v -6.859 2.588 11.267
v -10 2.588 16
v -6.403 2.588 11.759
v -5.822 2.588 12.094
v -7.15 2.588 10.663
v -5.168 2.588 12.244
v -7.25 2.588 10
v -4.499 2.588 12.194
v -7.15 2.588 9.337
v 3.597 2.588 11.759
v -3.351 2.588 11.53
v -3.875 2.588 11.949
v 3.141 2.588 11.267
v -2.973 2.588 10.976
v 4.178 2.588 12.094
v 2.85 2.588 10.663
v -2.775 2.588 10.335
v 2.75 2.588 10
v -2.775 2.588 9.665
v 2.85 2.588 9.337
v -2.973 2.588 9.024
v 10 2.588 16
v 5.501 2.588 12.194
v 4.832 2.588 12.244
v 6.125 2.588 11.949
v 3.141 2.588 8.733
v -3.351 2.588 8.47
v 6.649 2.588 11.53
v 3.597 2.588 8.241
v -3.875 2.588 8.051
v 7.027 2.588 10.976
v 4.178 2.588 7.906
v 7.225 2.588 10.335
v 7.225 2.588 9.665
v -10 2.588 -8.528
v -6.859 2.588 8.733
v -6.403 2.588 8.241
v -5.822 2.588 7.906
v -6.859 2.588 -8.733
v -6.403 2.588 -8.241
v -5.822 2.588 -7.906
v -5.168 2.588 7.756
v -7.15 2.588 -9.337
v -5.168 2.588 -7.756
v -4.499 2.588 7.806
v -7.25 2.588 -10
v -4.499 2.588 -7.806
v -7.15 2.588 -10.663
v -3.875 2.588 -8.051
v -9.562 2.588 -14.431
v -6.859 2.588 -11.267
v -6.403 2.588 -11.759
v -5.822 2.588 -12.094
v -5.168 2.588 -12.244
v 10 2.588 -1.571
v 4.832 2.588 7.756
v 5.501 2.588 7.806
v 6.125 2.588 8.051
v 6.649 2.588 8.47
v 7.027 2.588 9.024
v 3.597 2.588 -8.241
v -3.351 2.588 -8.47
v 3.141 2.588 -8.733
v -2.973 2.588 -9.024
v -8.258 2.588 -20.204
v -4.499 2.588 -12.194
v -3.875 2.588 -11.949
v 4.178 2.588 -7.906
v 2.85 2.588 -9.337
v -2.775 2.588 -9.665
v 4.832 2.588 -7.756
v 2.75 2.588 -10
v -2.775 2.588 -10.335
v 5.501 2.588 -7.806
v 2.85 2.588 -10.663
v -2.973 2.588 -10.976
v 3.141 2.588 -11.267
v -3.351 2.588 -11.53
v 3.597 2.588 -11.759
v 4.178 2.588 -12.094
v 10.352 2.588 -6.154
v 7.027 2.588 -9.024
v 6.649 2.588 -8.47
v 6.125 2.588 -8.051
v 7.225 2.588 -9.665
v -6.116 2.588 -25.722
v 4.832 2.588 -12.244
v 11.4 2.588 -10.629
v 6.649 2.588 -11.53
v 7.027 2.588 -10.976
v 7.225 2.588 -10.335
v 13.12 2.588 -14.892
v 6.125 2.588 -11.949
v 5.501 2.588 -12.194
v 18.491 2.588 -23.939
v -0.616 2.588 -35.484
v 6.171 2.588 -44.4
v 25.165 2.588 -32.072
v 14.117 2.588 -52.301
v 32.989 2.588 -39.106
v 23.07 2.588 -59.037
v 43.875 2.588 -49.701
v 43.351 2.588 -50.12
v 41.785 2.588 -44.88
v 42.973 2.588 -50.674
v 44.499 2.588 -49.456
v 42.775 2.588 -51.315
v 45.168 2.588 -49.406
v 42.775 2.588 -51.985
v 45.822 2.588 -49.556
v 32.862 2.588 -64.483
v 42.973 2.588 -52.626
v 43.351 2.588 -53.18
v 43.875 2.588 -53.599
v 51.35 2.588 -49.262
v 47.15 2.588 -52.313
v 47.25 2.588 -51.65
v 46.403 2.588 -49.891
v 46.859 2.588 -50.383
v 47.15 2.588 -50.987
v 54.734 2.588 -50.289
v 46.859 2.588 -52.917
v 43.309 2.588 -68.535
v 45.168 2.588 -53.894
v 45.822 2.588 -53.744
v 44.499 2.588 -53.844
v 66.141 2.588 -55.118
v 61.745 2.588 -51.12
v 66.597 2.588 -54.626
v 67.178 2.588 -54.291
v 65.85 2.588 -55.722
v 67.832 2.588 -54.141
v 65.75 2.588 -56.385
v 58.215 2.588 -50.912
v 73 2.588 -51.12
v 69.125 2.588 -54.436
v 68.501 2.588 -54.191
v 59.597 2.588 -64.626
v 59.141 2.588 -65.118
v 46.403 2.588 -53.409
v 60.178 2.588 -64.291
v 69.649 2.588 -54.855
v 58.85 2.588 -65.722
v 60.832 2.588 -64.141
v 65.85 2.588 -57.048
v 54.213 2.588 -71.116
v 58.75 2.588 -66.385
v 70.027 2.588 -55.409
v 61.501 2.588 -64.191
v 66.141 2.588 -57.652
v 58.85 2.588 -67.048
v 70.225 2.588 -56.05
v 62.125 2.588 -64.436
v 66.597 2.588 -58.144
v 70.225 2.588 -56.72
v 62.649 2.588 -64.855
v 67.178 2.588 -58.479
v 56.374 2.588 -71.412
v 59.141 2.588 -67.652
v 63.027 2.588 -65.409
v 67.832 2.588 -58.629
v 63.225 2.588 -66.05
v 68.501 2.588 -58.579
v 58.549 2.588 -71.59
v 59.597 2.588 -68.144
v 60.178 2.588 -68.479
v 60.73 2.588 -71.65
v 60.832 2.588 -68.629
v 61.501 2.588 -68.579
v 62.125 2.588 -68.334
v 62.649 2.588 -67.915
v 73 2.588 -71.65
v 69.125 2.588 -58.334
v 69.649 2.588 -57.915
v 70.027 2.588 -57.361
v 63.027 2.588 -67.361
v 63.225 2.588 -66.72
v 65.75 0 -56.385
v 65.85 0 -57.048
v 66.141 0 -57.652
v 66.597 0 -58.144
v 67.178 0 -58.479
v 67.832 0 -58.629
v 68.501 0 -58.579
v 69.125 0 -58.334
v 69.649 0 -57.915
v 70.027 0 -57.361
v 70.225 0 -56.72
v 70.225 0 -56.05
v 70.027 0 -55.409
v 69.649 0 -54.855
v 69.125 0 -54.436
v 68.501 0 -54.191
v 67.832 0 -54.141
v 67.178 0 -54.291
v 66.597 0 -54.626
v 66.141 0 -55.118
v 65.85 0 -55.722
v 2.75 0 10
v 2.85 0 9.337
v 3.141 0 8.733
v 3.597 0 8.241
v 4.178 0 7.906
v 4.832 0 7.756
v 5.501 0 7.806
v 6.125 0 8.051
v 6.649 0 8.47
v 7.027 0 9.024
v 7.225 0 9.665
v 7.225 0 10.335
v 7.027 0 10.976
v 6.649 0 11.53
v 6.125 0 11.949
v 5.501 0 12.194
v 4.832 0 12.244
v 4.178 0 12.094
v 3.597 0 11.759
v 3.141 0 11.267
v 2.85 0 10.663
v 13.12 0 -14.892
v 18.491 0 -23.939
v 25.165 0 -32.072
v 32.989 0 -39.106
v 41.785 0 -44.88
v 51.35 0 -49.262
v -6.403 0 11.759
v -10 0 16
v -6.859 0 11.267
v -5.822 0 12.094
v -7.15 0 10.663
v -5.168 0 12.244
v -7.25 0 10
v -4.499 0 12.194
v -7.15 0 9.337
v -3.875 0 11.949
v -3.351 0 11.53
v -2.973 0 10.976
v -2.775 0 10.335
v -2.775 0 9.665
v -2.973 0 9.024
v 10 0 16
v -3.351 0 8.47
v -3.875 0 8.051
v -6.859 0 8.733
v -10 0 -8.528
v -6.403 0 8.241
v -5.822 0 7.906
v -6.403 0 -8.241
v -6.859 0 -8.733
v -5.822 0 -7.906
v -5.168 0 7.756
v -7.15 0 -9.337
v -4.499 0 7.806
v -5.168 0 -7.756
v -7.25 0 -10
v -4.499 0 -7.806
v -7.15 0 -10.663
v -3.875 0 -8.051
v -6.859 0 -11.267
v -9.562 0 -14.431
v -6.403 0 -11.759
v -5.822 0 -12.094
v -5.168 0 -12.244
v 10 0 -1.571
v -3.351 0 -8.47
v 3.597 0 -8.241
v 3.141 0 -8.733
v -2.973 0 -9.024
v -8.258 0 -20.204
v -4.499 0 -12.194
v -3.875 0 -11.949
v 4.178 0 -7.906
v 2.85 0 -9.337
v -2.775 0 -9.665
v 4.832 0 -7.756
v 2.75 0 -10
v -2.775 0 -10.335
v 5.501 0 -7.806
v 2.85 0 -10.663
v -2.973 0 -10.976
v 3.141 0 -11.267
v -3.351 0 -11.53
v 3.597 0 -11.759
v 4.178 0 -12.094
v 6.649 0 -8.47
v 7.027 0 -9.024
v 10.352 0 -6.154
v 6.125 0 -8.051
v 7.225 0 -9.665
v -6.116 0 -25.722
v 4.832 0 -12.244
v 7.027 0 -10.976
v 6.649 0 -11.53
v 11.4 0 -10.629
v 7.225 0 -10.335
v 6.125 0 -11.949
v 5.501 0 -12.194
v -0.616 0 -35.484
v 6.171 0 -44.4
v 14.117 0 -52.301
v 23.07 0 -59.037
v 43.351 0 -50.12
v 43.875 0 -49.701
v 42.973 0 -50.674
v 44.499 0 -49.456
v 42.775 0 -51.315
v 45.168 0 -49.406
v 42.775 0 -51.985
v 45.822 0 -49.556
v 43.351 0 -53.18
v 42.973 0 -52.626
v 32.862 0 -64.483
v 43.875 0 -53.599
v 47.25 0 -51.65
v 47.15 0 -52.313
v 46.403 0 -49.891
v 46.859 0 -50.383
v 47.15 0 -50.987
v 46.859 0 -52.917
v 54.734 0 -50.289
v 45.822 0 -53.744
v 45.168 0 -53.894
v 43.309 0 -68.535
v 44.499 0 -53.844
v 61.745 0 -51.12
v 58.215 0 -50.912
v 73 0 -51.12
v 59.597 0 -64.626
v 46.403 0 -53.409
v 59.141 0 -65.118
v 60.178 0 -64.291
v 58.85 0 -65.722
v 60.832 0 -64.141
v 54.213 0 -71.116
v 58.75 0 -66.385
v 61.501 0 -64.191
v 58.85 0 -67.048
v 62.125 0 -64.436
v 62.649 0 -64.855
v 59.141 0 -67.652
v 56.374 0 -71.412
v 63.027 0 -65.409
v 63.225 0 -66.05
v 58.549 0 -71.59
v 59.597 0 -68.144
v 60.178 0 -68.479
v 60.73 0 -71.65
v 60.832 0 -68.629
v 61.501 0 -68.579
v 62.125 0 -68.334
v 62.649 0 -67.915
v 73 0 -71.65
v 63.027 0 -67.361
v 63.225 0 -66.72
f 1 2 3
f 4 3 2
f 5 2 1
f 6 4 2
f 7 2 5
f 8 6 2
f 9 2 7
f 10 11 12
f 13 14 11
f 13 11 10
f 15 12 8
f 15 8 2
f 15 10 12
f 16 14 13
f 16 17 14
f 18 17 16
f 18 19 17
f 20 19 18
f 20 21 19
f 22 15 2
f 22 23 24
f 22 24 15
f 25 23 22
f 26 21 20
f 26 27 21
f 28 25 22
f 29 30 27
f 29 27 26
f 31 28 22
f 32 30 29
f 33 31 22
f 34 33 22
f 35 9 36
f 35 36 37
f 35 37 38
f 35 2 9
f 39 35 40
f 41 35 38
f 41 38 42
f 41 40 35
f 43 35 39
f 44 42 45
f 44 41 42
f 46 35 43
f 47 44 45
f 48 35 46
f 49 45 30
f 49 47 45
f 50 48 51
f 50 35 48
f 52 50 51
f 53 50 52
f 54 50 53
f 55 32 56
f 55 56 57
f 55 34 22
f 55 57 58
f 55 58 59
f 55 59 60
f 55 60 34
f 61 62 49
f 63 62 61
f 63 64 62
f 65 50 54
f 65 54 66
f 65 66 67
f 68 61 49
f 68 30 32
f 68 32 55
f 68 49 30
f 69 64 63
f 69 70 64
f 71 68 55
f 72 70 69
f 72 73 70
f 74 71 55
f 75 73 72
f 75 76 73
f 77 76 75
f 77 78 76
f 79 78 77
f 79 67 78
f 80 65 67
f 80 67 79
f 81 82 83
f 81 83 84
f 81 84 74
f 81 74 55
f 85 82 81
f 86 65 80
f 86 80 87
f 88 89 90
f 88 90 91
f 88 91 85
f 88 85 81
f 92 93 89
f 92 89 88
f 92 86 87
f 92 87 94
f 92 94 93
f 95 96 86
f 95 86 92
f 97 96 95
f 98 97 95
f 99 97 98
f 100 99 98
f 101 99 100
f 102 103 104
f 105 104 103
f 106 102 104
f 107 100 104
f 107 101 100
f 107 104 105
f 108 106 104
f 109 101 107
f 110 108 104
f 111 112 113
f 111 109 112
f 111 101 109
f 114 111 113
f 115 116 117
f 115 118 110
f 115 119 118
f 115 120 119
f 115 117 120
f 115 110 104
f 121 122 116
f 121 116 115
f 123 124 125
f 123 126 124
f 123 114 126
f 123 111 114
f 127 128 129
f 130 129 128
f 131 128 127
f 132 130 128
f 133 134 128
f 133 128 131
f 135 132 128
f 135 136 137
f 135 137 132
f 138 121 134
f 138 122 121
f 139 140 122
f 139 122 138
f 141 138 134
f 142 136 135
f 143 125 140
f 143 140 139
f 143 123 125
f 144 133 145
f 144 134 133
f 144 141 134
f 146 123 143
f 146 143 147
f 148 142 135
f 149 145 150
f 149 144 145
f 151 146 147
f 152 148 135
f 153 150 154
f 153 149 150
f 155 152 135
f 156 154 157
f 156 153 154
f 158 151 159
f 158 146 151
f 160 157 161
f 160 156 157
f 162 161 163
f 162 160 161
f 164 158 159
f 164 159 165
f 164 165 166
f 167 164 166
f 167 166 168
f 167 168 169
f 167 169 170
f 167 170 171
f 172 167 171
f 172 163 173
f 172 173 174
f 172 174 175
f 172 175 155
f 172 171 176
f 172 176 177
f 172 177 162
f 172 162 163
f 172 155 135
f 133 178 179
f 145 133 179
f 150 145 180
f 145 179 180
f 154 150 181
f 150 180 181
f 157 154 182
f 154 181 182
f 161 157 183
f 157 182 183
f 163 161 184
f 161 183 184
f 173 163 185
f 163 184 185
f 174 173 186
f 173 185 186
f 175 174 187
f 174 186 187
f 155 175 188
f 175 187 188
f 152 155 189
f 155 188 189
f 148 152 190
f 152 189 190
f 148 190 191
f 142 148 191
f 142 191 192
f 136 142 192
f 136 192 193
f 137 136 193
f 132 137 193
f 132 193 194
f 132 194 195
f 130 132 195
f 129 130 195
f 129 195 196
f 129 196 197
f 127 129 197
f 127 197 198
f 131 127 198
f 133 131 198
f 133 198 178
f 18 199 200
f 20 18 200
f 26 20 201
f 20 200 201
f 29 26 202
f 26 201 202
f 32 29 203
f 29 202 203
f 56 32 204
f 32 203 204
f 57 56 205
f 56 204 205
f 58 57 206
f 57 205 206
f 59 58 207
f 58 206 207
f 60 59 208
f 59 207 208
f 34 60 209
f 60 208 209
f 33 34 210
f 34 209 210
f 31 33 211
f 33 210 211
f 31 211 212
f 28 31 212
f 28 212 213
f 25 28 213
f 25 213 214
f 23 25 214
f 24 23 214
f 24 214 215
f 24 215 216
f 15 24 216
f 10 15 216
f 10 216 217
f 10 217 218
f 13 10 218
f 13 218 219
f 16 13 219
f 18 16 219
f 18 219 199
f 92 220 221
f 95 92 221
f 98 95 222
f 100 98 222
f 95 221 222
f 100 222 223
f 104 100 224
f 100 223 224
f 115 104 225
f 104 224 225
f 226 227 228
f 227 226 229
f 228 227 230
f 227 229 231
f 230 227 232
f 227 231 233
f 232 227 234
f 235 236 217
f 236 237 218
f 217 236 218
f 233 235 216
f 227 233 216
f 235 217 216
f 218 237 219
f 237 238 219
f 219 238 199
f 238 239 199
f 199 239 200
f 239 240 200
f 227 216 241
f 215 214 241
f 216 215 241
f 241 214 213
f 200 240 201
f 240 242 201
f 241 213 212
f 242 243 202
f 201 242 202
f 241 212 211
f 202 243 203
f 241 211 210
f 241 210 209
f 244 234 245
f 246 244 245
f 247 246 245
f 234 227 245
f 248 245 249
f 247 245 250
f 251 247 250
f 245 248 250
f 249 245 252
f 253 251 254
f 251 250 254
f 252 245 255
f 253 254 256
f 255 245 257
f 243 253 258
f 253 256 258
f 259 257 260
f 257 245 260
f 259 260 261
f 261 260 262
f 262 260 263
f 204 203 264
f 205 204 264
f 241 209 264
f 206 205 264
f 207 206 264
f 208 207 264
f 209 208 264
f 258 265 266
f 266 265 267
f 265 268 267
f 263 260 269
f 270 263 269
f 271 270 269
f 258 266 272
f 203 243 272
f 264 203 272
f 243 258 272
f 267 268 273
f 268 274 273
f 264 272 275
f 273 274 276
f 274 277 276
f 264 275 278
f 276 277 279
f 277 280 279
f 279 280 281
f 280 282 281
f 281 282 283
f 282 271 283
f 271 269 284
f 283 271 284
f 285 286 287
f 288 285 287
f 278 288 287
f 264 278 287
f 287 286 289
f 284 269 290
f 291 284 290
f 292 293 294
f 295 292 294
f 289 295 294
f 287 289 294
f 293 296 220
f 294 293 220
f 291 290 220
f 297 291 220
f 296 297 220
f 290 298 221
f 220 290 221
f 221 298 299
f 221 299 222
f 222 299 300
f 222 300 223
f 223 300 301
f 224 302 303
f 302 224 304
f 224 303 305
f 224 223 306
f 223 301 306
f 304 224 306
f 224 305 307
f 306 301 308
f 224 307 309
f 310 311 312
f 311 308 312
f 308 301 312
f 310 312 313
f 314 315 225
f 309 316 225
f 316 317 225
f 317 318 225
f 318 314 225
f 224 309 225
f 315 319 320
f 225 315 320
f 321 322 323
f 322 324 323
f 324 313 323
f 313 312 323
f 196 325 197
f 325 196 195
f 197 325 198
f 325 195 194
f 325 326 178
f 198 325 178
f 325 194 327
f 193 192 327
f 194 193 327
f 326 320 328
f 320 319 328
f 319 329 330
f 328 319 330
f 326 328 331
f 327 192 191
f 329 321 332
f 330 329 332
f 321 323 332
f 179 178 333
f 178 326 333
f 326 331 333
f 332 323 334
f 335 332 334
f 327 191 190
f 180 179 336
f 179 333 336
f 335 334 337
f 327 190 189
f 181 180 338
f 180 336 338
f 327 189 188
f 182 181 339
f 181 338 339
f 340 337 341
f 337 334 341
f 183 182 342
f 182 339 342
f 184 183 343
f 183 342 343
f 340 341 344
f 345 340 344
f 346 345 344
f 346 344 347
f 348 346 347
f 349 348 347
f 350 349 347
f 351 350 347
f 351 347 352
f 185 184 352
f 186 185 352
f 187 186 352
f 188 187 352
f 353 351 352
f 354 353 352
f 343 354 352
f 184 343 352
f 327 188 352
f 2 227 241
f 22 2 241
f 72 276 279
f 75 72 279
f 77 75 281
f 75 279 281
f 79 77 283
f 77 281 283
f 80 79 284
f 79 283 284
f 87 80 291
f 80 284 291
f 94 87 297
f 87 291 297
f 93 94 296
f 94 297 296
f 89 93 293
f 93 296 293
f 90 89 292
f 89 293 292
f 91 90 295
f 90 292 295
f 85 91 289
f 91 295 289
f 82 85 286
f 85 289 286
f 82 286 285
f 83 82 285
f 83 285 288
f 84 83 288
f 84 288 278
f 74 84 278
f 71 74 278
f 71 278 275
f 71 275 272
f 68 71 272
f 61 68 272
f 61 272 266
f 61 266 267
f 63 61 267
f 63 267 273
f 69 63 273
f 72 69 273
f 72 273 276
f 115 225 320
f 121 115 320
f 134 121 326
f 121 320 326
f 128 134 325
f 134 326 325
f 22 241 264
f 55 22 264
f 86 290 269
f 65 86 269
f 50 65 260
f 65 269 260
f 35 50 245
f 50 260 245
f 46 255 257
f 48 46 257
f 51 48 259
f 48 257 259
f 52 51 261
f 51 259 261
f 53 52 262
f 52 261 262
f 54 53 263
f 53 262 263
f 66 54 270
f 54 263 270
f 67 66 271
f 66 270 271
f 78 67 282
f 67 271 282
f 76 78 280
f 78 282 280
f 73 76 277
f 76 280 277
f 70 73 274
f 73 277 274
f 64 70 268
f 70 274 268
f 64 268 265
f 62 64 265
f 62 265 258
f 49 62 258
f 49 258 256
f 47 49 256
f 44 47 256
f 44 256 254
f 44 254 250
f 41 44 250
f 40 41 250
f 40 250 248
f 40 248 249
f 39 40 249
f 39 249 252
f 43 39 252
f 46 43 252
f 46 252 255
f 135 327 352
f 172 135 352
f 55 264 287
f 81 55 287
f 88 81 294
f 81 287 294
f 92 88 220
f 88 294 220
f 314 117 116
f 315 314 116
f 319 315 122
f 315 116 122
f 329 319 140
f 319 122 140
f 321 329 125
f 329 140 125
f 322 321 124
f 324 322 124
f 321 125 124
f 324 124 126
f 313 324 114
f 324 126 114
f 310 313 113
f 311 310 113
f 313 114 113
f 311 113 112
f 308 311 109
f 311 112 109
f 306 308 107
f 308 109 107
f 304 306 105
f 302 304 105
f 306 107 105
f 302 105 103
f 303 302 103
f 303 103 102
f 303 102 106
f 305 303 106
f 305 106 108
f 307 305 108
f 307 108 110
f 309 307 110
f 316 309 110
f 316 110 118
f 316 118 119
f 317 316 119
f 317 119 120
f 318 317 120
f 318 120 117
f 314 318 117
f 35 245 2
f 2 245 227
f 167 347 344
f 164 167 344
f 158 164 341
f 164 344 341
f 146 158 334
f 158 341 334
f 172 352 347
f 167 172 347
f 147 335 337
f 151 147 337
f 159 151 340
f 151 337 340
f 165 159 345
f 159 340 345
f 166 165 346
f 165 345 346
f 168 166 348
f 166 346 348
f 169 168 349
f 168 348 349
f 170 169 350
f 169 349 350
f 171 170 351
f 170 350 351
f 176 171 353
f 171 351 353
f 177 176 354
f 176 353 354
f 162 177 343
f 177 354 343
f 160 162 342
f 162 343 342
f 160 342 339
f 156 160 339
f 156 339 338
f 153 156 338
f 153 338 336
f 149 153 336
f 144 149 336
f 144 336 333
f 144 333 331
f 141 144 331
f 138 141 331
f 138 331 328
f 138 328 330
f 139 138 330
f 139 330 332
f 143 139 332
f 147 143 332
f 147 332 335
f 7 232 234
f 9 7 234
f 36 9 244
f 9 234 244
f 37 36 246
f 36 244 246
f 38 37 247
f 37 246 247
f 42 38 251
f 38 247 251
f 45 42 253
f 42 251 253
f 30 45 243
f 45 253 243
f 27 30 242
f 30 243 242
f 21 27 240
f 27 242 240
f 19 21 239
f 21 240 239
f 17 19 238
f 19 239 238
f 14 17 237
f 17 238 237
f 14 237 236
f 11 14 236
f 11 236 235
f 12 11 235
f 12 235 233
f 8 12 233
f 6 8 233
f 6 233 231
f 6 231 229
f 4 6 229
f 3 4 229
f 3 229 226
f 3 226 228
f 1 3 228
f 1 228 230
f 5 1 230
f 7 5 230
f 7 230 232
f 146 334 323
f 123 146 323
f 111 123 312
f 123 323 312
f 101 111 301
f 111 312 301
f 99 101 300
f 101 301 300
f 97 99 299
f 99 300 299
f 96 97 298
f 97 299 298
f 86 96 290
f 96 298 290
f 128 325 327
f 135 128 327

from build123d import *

# Parameters (mm, degrees)
BOSS_EXTRUDE1_DEPTH      = 2.58826
M4_CLEARANCE_HOLE1_D     = 4.5
M4_CLEARANCE_HOLE2_D     = 4.5
M4_CLEARANCE_HOLE3_D     = 4.5
M4_CLEARANCE_HOLE3_DEPTH = 12.45
M4_CLEARANCE_HOLE3_TIP   = 1.351936393


with BuildPart() as part:
    # Sketch1 → Boss-Extrude1 (new body)
    with BuildSketch(Plane(origin=(0, 0, 0), x_dir=(1, 0, 0), z_dir=(0, 1, 0))):
        with BuildLine():
            Line((-10, -16), (10, -16))
            Line((10, -16), (10, 1.571108341))
            ThreePointArc((10, 1.571108341), (10.790342052, 8.411859949), (13.119725505, 14.89217598))
            ThreePointArc((13.119725505, 14.89217598), (28.94391879, 35.737554133), (51.350094649, 49.261539007))
            ThreePointArc((51.350094649, 49.261539007), (56.465127412, 50.651730141), (61.744986775, 51.12))
            Line((61.744986775, 51.12), (73, 51.12))
            Line((73, 51.12), (73, 71.65))
            Line((73, 71.65), (60.729747862, 71.65))
            ThreePointArc((60.729747862, 71.65), (57.460315443, 71.516161236), (54.212761864, 71.115540583))
            ThreePointArc((54.212761864, 71.115540583), (18.477348074, 55.823044348), (-6.115833148, 25.722285599))
            ThreePointArc((-6.115833148, 25.722285599), (-9.016876643, 17.34172385), (-10, 8.527908726))
            Line((-10, 8.527908726), (-10, -16))
        make_face()
    extrude(amount=BOSS_EXTRUDE1_DEPTH)

    # M4 Clearance Hole1 (through all)
    with Locations(Plane(origin=(0, 2.58826, 0), x_dir=(1, 0, 0), z_dir=(0, 1, 0))):
        with Locations((-5, 10), (5, 10), (5, -10), (-5, -10)):
            Hole(M4_CLEARANCE_HOLE1_D / 2)

    # M4 Clearance Hole2 (through all)
    with Locations(Plane(origin=(0, 2.58826, 0), x_dir=(1, 0, 0), z_dir=(0, 1, 0))):
        with Locations((61, 66.385), (68, 56.385)):
            Hole(M4_CLEARANCE_HOLE2_D / 2)

    # M4 Clearance Hole3
    with Locations(Plane(origin=(0, 0, 0), x_dir=(-1, 0, 0), z_dir=(0, -1, 0))):
        with Locations((-45, 51.65)):
            Hole(M4_CLEARANCE_HOLE3_D / 2, depth=M4_CLEARANCE_HOLE3_DEPTH)
            with Locations((0, 0, -(M4_CLEARANCE_HOLE3_DEPTH + M4_CLEARANCE_HOLE3_TIP / 2))):  # 118° drill point
                Cone(0, M4_CLEARANCE_HOLE3_D / 2, M4_CLEARANCE_HOLE3_TIP, mode=Mode.SUBTRACT)


solid = part.part
